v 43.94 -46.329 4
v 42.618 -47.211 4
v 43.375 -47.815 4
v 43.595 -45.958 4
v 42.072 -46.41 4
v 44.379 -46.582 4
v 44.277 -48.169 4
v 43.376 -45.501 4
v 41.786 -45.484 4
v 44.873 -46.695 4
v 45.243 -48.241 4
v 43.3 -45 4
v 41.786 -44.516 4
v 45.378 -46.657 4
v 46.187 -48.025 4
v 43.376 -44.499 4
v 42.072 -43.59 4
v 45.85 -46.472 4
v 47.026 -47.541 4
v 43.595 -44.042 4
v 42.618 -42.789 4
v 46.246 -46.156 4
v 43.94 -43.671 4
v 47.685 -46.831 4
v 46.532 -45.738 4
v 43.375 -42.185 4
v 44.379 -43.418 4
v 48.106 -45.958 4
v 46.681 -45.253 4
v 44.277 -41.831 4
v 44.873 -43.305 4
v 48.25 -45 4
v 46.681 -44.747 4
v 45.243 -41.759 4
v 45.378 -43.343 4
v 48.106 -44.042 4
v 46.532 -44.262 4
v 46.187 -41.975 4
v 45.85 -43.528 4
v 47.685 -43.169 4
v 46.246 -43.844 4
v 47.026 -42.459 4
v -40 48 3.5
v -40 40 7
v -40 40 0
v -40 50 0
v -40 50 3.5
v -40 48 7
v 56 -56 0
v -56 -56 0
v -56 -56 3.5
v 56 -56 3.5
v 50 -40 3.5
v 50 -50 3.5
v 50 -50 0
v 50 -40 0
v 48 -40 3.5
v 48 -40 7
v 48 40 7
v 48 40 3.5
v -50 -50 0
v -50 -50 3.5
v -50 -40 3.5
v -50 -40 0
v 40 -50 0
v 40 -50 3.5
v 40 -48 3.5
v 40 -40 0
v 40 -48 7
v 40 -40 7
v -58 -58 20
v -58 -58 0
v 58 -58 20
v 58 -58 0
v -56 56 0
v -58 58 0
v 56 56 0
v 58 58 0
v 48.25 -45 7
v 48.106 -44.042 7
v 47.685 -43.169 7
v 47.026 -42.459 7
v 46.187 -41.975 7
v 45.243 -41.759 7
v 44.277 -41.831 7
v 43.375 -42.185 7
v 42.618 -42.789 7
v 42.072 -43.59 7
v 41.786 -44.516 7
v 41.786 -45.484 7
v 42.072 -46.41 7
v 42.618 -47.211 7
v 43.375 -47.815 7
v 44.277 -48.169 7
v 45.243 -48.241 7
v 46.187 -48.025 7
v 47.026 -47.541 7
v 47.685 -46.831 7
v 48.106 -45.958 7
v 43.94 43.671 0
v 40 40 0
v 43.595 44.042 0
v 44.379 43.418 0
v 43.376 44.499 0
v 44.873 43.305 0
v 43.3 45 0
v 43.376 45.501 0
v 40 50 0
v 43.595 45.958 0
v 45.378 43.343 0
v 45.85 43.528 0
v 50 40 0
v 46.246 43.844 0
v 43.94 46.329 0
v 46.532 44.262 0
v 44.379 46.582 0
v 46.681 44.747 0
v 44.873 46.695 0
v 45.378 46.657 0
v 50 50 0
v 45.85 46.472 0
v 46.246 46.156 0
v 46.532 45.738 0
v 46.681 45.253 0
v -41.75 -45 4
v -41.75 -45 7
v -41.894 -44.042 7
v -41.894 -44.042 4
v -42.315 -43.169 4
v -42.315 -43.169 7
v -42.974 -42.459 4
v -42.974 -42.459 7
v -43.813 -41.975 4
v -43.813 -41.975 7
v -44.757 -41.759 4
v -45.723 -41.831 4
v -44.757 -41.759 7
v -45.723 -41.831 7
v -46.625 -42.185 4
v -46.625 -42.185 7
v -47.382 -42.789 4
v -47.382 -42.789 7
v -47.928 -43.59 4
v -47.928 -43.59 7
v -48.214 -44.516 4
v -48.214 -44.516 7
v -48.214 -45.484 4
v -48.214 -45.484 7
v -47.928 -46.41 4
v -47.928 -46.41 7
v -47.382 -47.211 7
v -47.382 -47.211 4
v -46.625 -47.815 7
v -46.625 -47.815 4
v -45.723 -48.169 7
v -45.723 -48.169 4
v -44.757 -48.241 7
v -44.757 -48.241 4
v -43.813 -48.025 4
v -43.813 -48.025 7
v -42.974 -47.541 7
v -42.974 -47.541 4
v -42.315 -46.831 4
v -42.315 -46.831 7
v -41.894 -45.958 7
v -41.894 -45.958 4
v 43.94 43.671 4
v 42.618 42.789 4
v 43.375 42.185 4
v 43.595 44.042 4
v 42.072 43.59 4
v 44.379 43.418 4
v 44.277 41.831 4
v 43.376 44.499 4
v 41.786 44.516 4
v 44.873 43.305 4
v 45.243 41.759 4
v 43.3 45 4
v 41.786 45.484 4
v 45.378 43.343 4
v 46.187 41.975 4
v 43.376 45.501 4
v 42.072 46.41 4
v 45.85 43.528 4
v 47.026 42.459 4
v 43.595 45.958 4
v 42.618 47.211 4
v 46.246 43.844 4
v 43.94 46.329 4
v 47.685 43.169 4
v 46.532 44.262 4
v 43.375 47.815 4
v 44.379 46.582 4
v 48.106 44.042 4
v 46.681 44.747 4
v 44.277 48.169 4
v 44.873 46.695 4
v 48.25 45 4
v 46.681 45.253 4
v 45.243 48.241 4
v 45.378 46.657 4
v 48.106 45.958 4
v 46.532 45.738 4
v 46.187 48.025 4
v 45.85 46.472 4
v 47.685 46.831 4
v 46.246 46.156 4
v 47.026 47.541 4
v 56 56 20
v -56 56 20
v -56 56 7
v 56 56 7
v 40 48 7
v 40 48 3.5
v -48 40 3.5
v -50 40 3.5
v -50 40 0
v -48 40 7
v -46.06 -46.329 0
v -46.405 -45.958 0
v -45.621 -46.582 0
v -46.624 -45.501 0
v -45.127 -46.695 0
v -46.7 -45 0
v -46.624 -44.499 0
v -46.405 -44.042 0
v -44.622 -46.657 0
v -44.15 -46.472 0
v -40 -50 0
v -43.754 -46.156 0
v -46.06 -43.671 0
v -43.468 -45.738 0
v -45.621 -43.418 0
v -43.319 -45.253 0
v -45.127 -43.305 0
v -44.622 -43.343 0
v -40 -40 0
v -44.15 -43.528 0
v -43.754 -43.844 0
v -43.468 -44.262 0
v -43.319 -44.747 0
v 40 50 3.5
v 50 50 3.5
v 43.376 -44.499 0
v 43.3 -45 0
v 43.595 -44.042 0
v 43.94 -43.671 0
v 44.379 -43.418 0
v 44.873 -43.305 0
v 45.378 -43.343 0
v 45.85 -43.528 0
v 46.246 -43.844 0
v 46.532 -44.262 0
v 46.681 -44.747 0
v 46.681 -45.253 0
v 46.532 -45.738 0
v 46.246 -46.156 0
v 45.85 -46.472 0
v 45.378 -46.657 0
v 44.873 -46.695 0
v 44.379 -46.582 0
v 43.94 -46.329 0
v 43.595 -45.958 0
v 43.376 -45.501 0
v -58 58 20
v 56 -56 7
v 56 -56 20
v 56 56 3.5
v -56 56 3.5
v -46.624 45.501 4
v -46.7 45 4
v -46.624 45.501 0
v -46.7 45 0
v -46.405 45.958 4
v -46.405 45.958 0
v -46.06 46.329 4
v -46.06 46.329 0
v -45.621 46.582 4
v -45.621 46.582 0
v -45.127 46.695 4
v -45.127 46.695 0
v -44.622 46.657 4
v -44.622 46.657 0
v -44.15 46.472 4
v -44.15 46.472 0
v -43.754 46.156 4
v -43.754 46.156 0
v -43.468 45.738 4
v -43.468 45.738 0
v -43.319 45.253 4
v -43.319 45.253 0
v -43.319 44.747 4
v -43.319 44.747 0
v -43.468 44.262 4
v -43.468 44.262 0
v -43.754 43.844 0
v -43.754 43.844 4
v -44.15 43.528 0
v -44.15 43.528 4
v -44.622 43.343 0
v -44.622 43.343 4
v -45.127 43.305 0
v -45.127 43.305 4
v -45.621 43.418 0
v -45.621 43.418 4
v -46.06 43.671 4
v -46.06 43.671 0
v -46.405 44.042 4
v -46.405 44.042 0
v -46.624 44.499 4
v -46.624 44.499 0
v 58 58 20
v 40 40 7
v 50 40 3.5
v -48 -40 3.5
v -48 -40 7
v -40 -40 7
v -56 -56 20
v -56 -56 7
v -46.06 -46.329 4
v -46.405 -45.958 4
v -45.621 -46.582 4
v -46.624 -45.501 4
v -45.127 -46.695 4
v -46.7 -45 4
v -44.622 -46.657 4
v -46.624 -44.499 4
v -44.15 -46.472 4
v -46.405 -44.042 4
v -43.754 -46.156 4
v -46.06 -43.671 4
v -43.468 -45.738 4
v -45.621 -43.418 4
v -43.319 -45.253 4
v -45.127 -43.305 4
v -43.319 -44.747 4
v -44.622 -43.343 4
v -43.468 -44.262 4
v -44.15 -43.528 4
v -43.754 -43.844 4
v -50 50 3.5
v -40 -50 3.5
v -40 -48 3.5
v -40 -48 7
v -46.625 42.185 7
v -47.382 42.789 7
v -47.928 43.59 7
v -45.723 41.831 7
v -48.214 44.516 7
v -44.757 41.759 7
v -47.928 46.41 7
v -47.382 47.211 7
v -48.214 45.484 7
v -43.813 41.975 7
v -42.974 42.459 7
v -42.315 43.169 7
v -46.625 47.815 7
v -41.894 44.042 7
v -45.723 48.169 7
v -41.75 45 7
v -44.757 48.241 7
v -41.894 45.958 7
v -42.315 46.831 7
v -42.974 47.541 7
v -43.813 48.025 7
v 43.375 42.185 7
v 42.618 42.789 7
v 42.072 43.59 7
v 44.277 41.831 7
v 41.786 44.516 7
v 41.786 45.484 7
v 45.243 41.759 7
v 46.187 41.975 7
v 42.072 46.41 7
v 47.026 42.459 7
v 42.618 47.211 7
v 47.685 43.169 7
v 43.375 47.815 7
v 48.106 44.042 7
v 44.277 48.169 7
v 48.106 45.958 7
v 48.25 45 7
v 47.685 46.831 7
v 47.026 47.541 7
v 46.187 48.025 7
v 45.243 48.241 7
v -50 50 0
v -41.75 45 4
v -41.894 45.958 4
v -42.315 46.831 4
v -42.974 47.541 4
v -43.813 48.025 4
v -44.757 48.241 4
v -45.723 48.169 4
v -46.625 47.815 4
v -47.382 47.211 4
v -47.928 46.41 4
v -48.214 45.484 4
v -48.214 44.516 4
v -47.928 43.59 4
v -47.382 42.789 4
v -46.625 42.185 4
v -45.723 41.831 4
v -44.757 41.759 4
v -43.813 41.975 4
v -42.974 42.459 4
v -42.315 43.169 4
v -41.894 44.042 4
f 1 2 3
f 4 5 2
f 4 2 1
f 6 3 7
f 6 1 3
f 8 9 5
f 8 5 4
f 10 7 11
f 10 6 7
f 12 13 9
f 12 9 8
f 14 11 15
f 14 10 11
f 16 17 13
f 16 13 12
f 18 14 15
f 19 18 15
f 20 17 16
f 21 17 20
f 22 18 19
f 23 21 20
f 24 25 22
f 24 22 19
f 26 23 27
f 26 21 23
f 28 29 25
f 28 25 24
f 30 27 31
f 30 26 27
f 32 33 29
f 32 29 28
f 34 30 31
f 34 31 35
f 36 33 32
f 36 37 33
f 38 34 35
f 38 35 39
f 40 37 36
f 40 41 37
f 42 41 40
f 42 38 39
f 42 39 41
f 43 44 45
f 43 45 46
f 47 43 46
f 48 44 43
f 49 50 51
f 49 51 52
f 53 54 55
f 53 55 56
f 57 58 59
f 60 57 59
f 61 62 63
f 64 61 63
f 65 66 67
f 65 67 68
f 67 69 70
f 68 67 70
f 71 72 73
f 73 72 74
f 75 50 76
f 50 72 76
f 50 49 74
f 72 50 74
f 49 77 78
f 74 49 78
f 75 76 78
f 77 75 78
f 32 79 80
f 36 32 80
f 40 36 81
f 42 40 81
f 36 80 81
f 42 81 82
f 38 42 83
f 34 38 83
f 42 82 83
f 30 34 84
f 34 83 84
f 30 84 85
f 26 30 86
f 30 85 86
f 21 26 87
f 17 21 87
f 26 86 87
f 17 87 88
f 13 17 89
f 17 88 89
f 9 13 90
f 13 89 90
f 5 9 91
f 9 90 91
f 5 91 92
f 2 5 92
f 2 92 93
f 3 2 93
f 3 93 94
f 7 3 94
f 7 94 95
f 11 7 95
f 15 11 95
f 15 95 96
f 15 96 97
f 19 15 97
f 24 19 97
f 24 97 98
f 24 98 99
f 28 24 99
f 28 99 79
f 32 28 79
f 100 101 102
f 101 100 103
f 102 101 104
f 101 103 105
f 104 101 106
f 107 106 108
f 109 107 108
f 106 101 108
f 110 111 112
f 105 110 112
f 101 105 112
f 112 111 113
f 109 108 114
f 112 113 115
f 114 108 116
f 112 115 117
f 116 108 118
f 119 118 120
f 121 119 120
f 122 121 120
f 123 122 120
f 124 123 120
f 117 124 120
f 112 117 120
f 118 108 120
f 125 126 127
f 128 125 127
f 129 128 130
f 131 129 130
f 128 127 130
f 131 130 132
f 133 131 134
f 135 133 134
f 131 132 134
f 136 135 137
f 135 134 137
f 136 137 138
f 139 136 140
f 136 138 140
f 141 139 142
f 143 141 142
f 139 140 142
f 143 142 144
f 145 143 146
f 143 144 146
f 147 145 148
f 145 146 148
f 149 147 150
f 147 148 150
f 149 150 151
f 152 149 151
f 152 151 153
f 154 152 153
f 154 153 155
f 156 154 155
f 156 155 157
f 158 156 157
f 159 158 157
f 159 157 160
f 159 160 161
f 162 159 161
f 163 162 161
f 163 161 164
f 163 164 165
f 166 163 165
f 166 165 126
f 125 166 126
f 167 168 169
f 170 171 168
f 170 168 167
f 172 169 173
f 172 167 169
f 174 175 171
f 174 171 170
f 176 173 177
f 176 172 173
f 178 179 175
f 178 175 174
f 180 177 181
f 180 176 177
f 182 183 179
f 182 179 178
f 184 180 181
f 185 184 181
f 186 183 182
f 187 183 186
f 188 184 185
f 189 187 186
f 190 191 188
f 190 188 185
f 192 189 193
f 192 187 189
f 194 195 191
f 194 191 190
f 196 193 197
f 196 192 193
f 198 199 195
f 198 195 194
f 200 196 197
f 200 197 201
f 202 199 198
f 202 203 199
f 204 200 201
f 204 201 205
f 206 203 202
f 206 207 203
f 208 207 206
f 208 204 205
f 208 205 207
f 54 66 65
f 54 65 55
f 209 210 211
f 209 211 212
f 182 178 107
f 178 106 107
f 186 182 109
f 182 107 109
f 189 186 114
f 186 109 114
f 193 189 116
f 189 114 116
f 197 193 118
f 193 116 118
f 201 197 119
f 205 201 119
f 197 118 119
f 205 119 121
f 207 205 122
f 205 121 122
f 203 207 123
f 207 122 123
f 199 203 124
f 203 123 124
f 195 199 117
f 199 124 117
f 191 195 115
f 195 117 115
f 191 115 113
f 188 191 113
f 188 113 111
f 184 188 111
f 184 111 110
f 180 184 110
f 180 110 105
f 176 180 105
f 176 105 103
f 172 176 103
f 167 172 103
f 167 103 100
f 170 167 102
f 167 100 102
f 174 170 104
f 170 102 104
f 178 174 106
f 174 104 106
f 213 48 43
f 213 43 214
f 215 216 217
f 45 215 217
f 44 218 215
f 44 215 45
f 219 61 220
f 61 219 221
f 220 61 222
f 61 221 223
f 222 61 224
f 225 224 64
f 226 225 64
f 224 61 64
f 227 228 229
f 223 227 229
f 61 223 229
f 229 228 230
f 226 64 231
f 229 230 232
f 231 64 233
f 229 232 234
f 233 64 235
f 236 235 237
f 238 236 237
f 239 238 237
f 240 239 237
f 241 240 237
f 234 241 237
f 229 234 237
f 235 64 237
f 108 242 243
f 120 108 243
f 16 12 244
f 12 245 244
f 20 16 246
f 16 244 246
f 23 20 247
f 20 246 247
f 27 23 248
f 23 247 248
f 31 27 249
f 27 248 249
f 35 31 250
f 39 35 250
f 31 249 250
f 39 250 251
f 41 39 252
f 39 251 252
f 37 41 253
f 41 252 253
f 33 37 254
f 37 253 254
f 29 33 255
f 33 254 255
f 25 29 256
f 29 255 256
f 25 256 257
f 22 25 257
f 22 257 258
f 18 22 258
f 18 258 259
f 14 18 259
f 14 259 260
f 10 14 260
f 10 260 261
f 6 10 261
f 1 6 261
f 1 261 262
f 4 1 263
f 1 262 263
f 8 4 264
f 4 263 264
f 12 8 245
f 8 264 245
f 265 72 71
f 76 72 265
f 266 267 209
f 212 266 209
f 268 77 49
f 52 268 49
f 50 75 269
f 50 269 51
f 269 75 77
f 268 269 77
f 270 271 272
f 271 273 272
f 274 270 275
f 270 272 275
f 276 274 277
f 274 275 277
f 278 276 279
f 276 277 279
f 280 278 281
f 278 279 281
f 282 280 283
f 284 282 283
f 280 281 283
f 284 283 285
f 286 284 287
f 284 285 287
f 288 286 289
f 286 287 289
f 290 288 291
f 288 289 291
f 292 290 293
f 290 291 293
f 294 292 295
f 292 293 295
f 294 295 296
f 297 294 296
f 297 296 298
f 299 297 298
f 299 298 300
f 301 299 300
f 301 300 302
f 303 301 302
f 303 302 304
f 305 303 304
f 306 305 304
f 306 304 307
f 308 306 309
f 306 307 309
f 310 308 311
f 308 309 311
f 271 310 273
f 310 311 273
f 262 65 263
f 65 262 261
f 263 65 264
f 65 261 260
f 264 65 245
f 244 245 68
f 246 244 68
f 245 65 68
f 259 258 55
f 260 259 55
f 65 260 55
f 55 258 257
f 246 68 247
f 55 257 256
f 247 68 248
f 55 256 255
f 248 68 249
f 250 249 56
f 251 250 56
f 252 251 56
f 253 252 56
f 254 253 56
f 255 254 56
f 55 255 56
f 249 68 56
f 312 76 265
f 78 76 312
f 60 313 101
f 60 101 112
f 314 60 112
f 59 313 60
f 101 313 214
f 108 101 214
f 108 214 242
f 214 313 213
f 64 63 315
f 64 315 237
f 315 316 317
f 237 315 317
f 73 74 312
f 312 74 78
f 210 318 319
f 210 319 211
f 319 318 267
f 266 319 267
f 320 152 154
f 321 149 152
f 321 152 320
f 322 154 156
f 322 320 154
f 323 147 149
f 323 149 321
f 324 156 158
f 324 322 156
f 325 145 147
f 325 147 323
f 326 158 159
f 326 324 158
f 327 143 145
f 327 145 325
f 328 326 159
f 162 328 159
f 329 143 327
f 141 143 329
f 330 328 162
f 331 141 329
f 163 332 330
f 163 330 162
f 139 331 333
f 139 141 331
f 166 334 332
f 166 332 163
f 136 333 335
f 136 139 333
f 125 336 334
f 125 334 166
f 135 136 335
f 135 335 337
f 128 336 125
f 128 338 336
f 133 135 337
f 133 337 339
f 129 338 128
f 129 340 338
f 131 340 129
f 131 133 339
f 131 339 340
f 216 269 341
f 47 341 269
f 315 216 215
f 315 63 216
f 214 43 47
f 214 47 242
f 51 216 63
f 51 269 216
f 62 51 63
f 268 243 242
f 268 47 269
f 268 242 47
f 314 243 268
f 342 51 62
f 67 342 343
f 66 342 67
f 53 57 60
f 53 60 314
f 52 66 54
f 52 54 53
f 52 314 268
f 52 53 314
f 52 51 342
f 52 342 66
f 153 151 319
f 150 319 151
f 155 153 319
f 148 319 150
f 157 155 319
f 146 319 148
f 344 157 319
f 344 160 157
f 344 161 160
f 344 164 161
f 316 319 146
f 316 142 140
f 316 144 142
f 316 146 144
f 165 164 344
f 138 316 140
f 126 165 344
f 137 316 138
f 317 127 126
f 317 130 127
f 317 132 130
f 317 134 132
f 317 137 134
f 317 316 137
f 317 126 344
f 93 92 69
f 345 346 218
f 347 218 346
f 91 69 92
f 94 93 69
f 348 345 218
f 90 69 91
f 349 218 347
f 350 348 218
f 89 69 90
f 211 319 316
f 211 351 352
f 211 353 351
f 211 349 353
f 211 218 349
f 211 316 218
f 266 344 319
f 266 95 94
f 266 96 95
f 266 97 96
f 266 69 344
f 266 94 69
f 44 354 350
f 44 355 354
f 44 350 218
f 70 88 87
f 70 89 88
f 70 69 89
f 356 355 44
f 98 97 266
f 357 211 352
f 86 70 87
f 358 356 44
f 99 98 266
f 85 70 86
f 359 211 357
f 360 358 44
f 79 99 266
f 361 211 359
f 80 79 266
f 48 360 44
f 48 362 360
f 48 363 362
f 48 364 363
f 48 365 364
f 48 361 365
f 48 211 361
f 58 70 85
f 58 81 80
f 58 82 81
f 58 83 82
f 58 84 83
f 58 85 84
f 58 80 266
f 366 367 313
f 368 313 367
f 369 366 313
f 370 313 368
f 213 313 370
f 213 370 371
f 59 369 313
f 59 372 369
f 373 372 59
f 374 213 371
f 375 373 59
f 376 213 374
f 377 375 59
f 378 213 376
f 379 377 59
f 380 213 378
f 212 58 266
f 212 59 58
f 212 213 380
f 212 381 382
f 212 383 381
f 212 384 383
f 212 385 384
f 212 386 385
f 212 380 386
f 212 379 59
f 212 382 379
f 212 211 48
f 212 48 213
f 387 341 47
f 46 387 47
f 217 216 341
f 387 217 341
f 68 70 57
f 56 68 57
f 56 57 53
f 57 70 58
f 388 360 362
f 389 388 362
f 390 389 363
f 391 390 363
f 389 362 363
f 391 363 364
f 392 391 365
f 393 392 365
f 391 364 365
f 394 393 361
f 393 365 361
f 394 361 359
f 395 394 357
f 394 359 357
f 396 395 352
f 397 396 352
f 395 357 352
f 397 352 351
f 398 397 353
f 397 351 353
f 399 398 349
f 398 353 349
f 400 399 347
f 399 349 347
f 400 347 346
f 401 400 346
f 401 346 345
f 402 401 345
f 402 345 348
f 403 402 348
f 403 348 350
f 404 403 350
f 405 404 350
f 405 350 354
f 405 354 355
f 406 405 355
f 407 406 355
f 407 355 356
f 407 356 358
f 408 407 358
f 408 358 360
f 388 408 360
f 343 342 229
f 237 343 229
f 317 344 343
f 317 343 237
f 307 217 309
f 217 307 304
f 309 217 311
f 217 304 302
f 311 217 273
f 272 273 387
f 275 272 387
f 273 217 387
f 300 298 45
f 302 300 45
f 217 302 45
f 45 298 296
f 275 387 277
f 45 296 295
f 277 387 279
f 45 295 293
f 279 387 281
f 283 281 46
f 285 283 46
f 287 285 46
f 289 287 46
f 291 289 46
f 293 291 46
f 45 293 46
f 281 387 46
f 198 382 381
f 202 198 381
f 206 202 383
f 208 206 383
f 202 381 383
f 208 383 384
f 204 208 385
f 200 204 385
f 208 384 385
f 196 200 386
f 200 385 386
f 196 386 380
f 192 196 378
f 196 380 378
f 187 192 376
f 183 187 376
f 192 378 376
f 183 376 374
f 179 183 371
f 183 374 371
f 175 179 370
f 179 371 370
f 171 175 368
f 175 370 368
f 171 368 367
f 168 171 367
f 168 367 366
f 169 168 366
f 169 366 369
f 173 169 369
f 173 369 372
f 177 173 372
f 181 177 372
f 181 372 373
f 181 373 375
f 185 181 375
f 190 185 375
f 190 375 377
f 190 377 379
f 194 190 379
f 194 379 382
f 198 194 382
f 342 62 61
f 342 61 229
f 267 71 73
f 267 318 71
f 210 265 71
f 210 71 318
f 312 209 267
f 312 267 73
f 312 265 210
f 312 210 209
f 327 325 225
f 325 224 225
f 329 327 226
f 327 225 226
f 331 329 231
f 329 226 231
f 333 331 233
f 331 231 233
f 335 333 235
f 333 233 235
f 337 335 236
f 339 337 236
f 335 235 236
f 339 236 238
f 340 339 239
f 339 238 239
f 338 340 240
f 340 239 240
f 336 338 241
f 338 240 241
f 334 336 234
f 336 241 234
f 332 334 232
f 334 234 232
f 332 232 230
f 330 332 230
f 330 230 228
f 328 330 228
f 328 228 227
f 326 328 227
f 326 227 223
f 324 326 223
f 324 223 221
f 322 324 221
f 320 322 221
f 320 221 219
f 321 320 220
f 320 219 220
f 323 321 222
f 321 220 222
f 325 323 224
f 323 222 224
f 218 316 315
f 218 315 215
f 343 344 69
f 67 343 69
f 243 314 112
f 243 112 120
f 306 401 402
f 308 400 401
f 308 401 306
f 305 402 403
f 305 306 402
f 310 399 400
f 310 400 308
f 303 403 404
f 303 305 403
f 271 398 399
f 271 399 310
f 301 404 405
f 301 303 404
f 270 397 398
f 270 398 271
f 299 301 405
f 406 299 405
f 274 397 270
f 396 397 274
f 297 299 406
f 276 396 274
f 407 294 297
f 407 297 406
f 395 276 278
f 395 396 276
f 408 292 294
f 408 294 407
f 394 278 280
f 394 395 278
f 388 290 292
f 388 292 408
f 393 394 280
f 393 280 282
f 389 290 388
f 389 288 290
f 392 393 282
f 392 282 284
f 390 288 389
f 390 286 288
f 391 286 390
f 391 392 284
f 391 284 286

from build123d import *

# Parameters (mm, degrees)
F0_W            = 116
F0_H            = 116
F1_DEPTH        = 20
F2_W            = 112
F2_H            = 112
F3_DEPTH        = 13
F4_W            = 96
F4_H            = 96
F5_DEPTH        = 7
F6_W            = 112
F6_H            = 112
F6_W_2          = 96
F6_H_2          = 96
F7_DEPTH        = 3.5
F8_W            = 10
F8_H            = 10
F9_DEPTH        = 7
F11_D           = 3.4
F11_CBORE_D     = 6.5
F11_CBORE_DEPTH = 3


with BuildPart() as f1:
    # F0 (on Top) → F1 (new body)
    with BuildSketch(Plane.XY):
        Rectangle(F0_W, F0_H)
    extrude(amount=F1_DEPTH)

    # F2 (on face) → F3 (cut)
    with BuildSketch(Plane.XY.offset(20)):
        Rectangle(F2_W, F2_H)
    extrude(amount=-F3_DEPTH, mode=Mode.SUBTRACT)

    # F4 (on face) → F5 (cut, through all)
    with BuildSketch(Plane.XY.offset(7)):
        Rectangle(F4_W, F4_H)
    extrude(amount=-F5_DEPTH, mode=Mode.SUBTRACT)

    # F6 (on face) → F7 (cut)
    with BuildSketch(Plane(origin=(0, 0, 0), x_dir=(1, 0, 0), z_dir=(0, 0, -1))):
        Rectangle(F6_W, F6_H)
        Rectangle(F6_W_2, F6_H_2, mode=Mode.SUBTRACT)
    extrude(amount=-F7_DEPTH, mode=Mode.SUBTRACT)

    # F8 (on face) → F9 (join, through all)
    with BuildSketch(Plane.XY.offset(7)):
        with Locations((-45, 45)):
            Rectangle(F8_W, F8_H)
        with Locations((45, 45)):
            Rectangle(F8_W, F8_H)
        with Locations((-45, -45)):
            Rectangle(F8_W, F8_H)
        with Locations((45, -45)):
            Rectangle(F8_W, F8_H)
    extrude(amount=-F9_DEPTH)

    # F11 (through all)
    with Locations(Plane.XY.offset(7)):
        with Locations((45, 45), (-45, 45), (-45, -45), (45, -45)):
            CounterBoreHole(F11_D / 2, F11_CBORE_D / 2, F11_CBORE_DEPTH)


solid = f1.part
